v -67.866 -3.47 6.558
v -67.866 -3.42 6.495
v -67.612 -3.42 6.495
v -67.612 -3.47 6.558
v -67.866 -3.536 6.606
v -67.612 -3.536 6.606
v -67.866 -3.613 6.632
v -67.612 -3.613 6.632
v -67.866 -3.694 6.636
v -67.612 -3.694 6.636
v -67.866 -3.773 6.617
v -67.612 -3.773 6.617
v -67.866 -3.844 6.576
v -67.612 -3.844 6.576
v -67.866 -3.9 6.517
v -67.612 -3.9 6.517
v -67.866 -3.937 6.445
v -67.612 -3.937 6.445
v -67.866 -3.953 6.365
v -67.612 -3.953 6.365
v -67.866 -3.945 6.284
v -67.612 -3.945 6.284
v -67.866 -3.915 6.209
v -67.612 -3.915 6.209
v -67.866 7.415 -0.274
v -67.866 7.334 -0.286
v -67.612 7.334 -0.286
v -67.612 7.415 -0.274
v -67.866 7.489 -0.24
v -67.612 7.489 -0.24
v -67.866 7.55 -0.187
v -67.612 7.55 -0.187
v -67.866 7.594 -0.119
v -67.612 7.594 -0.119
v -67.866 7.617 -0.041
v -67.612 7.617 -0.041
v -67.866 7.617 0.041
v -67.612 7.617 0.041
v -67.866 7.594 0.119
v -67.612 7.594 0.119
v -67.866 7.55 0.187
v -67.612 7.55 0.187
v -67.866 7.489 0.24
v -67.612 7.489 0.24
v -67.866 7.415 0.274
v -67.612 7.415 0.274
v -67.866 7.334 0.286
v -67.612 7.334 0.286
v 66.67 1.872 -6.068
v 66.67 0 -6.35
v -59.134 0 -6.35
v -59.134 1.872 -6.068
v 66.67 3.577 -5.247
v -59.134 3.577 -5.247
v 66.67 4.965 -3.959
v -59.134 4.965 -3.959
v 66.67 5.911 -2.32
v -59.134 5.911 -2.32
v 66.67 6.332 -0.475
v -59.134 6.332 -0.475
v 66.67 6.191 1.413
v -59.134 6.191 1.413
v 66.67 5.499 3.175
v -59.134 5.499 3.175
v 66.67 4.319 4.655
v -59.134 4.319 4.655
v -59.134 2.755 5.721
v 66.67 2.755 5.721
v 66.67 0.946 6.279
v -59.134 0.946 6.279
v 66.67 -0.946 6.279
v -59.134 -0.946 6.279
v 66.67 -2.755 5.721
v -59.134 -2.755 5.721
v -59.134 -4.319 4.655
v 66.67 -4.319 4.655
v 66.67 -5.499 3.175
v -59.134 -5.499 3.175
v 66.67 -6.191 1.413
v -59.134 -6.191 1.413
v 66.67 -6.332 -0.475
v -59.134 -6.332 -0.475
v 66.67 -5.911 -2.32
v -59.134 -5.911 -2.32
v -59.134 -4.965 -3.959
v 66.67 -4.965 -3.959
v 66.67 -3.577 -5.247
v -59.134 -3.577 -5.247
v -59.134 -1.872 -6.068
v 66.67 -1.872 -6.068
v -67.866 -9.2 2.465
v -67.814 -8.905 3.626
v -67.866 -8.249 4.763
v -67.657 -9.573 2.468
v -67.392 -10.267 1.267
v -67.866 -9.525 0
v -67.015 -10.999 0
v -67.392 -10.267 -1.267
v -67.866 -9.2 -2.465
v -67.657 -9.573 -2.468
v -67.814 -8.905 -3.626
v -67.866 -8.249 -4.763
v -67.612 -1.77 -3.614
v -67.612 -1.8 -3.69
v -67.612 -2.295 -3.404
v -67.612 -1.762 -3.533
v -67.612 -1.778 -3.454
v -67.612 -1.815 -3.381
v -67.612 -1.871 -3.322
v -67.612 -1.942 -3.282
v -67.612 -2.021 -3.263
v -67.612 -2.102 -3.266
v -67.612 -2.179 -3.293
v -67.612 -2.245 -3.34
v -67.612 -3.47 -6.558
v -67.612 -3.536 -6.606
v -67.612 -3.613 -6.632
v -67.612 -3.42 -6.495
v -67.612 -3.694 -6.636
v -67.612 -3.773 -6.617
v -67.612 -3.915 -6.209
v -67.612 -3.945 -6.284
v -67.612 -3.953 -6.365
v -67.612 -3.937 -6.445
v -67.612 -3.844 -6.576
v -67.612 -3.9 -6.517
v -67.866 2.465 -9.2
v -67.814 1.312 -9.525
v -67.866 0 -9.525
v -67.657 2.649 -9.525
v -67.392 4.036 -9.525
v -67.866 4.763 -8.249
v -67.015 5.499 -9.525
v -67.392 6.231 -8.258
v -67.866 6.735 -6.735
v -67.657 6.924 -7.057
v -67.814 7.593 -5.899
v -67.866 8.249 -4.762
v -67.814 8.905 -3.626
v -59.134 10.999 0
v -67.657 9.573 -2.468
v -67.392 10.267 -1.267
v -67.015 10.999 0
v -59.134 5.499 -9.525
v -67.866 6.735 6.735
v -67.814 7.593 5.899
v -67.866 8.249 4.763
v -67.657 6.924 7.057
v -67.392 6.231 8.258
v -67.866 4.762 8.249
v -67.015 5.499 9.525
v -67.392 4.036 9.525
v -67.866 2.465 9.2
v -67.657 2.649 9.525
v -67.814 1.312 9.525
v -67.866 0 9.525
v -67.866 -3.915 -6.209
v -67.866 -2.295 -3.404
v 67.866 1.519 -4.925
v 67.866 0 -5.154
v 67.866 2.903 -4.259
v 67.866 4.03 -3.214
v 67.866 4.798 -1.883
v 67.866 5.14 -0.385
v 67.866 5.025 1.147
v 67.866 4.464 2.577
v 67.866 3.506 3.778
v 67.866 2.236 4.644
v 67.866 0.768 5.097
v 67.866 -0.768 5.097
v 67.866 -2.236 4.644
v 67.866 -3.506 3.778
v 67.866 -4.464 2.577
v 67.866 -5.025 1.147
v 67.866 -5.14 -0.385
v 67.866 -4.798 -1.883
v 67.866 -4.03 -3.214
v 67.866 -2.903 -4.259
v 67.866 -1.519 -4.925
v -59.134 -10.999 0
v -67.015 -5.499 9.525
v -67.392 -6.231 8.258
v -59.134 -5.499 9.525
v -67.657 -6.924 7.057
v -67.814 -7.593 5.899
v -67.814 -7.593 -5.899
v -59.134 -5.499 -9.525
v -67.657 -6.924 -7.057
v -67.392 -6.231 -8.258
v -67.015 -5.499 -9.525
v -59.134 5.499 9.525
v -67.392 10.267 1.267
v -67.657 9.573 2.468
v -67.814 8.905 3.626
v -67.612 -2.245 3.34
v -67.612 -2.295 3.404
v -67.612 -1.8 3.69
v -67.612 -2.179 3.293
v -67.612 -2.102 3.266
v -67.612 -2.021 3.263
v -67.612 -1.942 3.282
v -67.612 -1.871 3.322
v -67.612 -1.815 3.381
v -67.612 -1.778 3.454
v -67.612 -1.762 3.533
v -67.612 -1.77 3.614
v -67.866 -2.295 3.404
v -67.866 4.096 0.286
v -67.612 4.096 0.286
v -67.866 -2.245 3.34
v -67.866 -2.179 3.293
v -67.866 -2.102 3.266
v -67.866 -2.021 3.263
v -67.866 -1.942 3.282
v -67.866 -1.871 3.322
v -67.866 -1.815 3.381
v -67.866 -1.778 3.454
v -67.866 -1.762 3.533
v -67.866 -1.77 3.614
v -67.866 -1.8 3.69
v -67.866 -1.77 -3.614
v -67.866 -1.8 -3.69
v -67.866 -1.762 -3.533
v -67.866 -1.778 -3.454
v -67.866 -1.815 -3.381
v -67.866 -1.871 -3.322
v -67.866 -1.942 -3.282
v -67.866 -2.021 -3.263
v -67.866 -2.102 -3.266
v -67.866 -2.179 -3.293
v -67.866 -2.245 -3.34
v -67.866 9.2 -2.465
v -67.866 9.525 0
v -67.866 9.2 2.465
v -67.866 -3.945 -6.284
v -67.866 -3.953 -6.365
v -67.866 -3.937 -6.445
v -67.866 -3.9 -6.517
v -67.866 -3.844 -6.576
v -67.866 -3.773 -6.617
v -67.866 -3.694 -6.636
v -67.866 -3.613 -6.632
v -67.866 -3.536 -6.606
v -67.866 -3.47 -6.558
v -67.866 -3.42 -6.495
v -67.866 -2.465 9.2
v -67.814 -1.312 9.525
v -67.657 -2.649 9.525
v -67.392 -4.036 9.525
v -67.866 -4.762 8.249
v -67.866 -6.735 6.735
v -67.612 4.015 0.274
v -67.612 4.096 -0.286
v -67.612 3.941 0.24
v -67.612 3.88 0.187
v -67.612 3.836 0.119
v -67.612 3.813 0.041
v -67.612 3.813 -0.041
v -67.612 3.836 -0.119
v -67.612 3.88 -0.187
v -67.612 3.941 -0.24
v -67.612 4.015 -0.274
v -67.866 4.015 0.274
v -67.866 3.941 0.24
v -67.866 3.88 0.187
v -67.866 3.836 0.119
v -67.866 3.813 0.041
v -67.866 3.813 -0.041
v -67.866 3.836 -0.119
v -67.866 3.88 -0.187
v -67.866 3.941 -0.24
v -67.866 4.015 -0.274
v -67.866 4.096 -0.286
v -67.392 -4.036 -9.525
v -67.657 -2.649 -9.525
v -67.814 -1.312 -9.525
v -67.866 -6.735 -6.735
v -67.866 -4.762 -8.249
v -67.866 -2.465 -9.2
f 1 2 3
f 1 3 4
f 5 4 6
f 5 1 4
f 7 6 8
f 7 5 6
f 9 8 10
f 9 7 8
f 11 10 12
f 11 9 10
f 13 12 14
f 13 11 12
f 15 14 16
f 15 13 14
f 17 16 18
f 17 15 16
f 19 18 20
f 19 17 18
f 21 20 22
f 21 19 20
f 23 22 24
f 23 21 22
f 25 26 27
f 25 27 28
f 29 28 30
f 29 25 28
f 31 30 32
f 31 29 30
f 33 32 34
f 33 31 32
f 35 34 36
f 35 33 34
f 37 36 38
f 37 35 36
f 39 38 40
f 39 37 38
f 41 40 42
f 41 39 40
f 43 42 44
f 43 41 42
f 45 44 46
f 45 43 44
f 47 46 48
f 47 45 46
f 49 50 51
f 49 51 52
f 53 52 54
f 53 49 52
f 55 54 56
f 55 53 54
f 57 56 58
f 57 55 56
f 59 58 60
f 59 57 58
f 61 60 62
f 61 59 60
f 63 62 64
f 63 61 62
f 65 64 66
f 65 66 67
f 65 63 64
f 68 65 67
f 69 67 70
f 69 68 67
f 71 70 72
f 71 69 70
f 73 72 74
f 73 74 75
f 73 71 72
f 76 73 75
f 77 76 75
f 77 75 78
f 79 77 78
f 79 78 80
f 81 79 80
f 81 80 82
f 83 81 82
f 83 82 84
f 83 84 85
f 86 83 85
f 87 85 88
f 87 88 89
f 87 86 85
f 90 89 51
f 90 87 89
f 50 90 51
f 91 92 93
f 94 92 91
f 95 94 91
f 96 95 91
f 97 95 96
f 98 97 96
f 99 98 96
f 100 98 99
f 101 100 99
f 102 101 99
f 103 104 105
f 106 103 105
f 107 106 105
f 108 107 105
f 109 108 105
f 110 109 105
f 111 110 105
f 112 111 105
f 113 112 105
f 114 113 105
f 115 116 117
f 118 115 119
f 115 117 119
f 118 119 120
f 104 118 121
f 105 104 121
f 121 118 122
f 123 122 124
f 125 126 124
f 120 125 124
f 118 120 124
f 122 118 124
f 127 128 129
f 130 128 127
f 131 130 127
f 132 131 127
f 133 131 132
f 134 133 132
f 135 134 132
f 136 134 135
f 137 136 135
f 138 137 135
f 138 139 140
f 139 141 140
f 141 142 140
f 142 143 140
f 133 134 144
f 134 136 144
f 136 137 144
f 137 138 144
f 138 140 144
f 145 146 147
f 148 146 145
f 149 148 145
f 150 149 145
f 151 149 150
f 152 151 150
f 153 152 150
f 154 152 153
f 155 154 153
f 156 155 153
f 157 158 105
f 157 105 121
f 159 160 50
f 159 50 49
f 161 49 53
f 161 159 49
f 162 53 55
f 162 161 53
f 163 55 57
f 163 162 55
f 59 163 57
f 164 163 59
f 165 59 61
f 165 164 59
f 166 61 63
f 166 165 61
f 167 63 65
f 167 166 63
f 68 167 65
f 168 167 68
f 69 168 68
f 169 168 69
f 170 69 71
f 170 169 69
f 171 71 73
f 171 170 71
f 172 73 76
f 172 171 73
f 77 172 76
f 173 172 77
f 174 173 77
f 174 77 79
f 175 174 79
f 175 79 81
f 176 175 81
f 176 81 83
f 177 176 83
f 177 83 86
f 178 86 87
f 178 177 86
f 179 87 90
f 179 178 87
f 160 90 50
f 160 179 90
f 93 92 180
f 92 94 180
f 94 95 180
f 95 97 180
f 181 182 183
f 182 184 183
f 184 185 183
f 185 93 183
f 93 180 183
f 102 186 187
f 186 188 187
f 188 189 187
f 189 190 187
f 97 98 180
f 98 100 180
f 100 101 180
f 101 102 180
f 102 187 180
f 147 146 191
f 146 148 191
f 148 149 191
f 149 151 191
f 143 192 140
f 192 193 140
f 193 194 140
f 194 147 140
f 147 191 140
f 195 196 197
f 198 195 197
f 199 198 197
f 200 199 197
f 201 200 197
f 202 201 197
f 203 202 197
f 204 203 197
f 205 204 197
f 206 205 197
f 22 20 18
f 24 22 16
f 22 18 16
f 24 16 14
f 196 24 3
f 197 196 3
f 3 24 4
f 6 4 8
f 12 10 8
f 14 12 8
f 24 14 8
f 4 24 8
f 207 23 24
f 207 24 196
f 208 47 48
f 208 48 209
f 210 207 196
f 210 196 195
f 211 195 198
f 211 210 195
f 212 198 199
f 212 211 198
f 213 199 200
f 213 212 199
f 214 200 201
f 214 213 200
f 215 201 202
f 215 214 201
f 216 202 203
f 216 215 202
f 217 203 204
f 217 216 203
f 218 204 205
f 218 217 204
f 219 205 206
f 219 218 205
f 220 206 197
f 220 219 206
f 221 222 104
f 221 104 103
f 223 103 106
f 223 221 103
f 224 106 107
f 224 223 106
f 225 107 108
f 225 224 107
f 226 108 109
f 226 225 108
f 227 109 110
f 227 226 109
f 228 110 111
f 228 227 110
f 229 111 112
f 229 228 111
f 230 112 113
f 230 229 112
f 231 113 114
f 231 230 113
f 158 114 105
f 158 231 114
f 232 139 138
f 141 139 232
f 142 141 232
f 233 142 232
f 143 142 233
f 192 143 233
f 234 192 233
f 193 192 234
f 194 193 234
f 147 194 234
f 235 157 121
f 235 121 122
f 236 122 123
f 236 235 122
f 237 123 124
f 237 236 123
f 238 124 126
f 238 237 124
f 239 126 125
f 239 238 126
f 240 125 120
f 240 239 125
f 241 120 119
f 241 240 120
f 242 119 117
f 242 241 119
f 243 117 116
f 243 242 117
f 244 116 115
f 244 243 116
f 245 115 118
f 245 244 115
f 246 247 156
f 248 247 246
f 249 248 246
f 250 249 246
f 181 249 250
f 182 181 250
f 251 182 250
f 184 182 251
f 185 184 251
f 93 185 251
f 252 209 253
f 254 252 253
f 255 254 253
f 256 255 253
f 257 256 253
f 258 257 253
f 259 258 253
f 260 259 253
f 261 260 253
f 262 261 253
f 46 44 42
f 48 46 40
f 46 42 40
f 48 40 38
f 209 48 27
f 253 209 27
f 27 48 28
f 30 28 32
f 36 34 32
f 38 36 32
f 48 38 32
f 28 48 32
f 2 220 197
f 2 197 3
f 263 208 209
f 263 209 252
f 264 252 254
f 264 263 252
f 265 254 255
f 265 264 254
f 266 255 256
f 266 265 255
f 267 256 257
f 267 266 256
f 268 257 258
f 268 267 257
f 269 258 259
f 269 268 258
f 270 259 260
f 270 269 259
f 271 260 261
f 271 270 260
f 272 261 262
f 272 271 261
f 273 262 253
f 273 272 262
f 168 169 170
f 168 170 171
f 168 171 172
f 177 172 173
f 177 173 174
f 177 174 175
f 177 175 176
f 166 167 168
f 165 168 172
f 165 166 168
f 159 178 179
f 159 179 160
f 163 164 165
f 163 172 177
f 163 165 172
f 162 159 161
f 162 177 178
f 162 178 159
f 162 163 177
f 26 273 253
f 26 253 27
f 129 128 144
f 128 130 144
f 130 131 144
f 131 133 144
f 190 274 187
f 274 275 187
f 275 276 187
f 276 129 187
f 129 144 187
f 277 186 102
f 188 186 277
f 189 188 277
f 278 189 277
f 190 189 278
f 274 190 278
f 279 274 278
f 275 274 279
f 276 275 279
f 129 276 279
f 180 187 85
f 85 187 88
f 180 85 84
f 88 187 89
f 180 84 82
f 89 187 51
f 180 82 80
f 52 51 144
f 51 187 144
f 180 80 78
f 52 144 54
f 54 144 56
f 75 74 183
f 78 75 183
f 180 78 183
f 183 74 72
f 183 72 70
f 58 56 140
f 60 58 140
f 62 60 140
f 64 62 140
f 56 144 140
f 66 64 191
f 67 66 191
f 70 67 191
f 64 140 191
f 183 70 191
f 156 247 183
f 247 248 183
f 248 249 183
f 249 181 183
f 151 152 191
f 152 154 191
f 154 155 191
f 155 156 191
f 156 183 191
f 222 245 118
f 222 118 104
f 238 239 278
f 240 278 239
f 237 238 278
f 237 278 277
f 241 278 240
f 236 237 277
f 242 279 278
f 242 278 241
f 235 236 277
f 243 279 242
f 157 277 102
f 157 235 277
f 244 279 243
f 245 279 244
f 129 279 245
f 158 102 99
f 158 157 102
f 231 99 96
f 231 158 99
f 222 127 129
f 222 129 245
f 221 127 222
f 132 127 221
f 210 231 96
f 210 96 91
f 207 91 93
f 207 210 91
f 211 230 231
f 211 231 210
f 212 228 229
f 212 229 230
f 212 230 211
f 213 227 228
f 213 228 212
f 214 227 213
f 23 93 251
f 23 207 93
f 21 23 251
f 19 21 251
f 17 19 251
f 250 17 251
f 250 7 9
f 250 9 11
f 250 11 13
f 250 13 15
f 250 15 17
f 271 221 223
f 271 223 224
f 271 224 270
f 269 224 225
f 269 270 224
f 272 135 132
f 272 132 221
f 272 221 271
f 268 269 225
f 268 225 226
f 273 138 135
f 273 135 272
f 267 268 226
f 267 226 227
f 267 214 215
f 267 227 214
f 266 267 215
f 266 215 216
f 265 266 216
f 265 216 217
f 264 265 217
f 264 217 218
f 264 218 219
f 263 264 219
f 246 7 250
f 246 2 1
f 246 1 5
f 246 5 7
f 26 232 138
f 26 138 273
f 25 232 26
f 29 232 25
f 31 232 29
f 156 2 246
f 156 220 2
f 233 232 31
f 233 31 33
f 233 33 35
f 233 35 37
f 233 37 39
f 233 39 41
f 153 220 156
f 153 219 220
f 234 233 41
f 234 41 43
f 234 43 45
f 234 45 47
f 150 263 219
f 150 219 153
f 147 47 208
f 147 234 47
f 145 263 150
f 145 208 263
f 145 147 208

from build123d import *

# Parameters (mm, degrees)
SKETCH5_R           = 6.35
BOSS_EXTRUDE3_DEPTH = 127
CHAMFER1_SIZE       = 1.195753846
BOSS_EXTRUDE4_DEPTH = 8.73125
SKETCH8_OUTSIDE_W   = 522.464
SKETCH8_OUTSIDE_H   = 525.412
SKETCH8_OUTSIDE_R   = 9.525
CUT_EXTRUDE3_DEPTH  = 136.73125
CUT_EXTRUDE3_TAPER  = 60
CUT_EXTRUDE4_DEPTH  = 0.254
CIRPATTERN1_COUNT   = 3


with BuildPart() as part:
    # Sketch5 → Boss-Extrude3 (new body)
    with BuildSketch(Plane(origin=(67.865625, 0, 0), x_dir=(0, 0, -1), z_dir=(1, 0, 0))):
        Circle(SKETCH5_R)
    extrude(amount=-BOSS_EXTRUDE3_DEPTH)

    # Chamfer1
    chamfer1_edges = [part.edges().sort_by_distance(p)[0] for p in [
        (67.865625, 0, 6.35),
    ]]
    chamfer(chamfer1_edges, length=CHAMFER1_SIZE)

    # Sketch6 → Boss-Extrude4 (add)
    with BuildSketch(Plane.ZY.offset(59.134375)):
        Polygon((9.525, 5.499261314), (0, 10.998522628), (-9.525, 5.499261314), (-9.525, -5.499261314), (0, -10.998522628), (9.525, -5.499261314), align=None)
    extrude(amount=BOSS_EXTRUDE4_DEPTH)

    # Sketch8 outside → Cut-Extrude3 (cut, through all)
    with BuildSketch(Plane.ZY.offset(67.865625)):
        Rectangle(SKETCH8_OUTSIDE_W, SKETCH8_OUTSIDE_H)
        Circle(SKETCH8_OUTSIDE_R, mode=Mode.SUBTRACT)
    extrude(amount=-CUT_EXTRUDE3_DEPTH, taper=CUT_EXTRUDE3_TAPER, mode=Mode.SUBTRACT)

    # Sketch12 → Cut-Extrude4 (cut)
    with BuildSketch(Plane.ZY.offset(67.865625)):
        with BuildLine():
            Line((0.28575, 7.33425), (0.28575, 4.09575))
            ThreePointArc((0.28575, 4.09575), (0, 3.81), (-0.28575, 4.09575))
            Line((-0.28575, 4.09575), (-0.28575, 7.33425))
            ThreePointArc((-0.28575, 7.33425), (0, 7.62), (0.28575, 7.33425))
        make_face()
    cut_extrude4 = extrude(amount=-CUT_EXTRUDE4_DEPTH, mode=Mode.SUBTRACT)

    # CirPattern1: Cut-Extrude4 ×3 about axis
    cirpattern1_axis = Axis((0, 0, 0), (1, 0, 0))
    for i in range(1, CIRPATTERN1_COUNT):
        add(cut_extrude4.rotate(cirpattern1_axis, i * 360 / CIRPATTERN1_COUNT), mode=Mode.SUBTRACT)


solid = part.part
